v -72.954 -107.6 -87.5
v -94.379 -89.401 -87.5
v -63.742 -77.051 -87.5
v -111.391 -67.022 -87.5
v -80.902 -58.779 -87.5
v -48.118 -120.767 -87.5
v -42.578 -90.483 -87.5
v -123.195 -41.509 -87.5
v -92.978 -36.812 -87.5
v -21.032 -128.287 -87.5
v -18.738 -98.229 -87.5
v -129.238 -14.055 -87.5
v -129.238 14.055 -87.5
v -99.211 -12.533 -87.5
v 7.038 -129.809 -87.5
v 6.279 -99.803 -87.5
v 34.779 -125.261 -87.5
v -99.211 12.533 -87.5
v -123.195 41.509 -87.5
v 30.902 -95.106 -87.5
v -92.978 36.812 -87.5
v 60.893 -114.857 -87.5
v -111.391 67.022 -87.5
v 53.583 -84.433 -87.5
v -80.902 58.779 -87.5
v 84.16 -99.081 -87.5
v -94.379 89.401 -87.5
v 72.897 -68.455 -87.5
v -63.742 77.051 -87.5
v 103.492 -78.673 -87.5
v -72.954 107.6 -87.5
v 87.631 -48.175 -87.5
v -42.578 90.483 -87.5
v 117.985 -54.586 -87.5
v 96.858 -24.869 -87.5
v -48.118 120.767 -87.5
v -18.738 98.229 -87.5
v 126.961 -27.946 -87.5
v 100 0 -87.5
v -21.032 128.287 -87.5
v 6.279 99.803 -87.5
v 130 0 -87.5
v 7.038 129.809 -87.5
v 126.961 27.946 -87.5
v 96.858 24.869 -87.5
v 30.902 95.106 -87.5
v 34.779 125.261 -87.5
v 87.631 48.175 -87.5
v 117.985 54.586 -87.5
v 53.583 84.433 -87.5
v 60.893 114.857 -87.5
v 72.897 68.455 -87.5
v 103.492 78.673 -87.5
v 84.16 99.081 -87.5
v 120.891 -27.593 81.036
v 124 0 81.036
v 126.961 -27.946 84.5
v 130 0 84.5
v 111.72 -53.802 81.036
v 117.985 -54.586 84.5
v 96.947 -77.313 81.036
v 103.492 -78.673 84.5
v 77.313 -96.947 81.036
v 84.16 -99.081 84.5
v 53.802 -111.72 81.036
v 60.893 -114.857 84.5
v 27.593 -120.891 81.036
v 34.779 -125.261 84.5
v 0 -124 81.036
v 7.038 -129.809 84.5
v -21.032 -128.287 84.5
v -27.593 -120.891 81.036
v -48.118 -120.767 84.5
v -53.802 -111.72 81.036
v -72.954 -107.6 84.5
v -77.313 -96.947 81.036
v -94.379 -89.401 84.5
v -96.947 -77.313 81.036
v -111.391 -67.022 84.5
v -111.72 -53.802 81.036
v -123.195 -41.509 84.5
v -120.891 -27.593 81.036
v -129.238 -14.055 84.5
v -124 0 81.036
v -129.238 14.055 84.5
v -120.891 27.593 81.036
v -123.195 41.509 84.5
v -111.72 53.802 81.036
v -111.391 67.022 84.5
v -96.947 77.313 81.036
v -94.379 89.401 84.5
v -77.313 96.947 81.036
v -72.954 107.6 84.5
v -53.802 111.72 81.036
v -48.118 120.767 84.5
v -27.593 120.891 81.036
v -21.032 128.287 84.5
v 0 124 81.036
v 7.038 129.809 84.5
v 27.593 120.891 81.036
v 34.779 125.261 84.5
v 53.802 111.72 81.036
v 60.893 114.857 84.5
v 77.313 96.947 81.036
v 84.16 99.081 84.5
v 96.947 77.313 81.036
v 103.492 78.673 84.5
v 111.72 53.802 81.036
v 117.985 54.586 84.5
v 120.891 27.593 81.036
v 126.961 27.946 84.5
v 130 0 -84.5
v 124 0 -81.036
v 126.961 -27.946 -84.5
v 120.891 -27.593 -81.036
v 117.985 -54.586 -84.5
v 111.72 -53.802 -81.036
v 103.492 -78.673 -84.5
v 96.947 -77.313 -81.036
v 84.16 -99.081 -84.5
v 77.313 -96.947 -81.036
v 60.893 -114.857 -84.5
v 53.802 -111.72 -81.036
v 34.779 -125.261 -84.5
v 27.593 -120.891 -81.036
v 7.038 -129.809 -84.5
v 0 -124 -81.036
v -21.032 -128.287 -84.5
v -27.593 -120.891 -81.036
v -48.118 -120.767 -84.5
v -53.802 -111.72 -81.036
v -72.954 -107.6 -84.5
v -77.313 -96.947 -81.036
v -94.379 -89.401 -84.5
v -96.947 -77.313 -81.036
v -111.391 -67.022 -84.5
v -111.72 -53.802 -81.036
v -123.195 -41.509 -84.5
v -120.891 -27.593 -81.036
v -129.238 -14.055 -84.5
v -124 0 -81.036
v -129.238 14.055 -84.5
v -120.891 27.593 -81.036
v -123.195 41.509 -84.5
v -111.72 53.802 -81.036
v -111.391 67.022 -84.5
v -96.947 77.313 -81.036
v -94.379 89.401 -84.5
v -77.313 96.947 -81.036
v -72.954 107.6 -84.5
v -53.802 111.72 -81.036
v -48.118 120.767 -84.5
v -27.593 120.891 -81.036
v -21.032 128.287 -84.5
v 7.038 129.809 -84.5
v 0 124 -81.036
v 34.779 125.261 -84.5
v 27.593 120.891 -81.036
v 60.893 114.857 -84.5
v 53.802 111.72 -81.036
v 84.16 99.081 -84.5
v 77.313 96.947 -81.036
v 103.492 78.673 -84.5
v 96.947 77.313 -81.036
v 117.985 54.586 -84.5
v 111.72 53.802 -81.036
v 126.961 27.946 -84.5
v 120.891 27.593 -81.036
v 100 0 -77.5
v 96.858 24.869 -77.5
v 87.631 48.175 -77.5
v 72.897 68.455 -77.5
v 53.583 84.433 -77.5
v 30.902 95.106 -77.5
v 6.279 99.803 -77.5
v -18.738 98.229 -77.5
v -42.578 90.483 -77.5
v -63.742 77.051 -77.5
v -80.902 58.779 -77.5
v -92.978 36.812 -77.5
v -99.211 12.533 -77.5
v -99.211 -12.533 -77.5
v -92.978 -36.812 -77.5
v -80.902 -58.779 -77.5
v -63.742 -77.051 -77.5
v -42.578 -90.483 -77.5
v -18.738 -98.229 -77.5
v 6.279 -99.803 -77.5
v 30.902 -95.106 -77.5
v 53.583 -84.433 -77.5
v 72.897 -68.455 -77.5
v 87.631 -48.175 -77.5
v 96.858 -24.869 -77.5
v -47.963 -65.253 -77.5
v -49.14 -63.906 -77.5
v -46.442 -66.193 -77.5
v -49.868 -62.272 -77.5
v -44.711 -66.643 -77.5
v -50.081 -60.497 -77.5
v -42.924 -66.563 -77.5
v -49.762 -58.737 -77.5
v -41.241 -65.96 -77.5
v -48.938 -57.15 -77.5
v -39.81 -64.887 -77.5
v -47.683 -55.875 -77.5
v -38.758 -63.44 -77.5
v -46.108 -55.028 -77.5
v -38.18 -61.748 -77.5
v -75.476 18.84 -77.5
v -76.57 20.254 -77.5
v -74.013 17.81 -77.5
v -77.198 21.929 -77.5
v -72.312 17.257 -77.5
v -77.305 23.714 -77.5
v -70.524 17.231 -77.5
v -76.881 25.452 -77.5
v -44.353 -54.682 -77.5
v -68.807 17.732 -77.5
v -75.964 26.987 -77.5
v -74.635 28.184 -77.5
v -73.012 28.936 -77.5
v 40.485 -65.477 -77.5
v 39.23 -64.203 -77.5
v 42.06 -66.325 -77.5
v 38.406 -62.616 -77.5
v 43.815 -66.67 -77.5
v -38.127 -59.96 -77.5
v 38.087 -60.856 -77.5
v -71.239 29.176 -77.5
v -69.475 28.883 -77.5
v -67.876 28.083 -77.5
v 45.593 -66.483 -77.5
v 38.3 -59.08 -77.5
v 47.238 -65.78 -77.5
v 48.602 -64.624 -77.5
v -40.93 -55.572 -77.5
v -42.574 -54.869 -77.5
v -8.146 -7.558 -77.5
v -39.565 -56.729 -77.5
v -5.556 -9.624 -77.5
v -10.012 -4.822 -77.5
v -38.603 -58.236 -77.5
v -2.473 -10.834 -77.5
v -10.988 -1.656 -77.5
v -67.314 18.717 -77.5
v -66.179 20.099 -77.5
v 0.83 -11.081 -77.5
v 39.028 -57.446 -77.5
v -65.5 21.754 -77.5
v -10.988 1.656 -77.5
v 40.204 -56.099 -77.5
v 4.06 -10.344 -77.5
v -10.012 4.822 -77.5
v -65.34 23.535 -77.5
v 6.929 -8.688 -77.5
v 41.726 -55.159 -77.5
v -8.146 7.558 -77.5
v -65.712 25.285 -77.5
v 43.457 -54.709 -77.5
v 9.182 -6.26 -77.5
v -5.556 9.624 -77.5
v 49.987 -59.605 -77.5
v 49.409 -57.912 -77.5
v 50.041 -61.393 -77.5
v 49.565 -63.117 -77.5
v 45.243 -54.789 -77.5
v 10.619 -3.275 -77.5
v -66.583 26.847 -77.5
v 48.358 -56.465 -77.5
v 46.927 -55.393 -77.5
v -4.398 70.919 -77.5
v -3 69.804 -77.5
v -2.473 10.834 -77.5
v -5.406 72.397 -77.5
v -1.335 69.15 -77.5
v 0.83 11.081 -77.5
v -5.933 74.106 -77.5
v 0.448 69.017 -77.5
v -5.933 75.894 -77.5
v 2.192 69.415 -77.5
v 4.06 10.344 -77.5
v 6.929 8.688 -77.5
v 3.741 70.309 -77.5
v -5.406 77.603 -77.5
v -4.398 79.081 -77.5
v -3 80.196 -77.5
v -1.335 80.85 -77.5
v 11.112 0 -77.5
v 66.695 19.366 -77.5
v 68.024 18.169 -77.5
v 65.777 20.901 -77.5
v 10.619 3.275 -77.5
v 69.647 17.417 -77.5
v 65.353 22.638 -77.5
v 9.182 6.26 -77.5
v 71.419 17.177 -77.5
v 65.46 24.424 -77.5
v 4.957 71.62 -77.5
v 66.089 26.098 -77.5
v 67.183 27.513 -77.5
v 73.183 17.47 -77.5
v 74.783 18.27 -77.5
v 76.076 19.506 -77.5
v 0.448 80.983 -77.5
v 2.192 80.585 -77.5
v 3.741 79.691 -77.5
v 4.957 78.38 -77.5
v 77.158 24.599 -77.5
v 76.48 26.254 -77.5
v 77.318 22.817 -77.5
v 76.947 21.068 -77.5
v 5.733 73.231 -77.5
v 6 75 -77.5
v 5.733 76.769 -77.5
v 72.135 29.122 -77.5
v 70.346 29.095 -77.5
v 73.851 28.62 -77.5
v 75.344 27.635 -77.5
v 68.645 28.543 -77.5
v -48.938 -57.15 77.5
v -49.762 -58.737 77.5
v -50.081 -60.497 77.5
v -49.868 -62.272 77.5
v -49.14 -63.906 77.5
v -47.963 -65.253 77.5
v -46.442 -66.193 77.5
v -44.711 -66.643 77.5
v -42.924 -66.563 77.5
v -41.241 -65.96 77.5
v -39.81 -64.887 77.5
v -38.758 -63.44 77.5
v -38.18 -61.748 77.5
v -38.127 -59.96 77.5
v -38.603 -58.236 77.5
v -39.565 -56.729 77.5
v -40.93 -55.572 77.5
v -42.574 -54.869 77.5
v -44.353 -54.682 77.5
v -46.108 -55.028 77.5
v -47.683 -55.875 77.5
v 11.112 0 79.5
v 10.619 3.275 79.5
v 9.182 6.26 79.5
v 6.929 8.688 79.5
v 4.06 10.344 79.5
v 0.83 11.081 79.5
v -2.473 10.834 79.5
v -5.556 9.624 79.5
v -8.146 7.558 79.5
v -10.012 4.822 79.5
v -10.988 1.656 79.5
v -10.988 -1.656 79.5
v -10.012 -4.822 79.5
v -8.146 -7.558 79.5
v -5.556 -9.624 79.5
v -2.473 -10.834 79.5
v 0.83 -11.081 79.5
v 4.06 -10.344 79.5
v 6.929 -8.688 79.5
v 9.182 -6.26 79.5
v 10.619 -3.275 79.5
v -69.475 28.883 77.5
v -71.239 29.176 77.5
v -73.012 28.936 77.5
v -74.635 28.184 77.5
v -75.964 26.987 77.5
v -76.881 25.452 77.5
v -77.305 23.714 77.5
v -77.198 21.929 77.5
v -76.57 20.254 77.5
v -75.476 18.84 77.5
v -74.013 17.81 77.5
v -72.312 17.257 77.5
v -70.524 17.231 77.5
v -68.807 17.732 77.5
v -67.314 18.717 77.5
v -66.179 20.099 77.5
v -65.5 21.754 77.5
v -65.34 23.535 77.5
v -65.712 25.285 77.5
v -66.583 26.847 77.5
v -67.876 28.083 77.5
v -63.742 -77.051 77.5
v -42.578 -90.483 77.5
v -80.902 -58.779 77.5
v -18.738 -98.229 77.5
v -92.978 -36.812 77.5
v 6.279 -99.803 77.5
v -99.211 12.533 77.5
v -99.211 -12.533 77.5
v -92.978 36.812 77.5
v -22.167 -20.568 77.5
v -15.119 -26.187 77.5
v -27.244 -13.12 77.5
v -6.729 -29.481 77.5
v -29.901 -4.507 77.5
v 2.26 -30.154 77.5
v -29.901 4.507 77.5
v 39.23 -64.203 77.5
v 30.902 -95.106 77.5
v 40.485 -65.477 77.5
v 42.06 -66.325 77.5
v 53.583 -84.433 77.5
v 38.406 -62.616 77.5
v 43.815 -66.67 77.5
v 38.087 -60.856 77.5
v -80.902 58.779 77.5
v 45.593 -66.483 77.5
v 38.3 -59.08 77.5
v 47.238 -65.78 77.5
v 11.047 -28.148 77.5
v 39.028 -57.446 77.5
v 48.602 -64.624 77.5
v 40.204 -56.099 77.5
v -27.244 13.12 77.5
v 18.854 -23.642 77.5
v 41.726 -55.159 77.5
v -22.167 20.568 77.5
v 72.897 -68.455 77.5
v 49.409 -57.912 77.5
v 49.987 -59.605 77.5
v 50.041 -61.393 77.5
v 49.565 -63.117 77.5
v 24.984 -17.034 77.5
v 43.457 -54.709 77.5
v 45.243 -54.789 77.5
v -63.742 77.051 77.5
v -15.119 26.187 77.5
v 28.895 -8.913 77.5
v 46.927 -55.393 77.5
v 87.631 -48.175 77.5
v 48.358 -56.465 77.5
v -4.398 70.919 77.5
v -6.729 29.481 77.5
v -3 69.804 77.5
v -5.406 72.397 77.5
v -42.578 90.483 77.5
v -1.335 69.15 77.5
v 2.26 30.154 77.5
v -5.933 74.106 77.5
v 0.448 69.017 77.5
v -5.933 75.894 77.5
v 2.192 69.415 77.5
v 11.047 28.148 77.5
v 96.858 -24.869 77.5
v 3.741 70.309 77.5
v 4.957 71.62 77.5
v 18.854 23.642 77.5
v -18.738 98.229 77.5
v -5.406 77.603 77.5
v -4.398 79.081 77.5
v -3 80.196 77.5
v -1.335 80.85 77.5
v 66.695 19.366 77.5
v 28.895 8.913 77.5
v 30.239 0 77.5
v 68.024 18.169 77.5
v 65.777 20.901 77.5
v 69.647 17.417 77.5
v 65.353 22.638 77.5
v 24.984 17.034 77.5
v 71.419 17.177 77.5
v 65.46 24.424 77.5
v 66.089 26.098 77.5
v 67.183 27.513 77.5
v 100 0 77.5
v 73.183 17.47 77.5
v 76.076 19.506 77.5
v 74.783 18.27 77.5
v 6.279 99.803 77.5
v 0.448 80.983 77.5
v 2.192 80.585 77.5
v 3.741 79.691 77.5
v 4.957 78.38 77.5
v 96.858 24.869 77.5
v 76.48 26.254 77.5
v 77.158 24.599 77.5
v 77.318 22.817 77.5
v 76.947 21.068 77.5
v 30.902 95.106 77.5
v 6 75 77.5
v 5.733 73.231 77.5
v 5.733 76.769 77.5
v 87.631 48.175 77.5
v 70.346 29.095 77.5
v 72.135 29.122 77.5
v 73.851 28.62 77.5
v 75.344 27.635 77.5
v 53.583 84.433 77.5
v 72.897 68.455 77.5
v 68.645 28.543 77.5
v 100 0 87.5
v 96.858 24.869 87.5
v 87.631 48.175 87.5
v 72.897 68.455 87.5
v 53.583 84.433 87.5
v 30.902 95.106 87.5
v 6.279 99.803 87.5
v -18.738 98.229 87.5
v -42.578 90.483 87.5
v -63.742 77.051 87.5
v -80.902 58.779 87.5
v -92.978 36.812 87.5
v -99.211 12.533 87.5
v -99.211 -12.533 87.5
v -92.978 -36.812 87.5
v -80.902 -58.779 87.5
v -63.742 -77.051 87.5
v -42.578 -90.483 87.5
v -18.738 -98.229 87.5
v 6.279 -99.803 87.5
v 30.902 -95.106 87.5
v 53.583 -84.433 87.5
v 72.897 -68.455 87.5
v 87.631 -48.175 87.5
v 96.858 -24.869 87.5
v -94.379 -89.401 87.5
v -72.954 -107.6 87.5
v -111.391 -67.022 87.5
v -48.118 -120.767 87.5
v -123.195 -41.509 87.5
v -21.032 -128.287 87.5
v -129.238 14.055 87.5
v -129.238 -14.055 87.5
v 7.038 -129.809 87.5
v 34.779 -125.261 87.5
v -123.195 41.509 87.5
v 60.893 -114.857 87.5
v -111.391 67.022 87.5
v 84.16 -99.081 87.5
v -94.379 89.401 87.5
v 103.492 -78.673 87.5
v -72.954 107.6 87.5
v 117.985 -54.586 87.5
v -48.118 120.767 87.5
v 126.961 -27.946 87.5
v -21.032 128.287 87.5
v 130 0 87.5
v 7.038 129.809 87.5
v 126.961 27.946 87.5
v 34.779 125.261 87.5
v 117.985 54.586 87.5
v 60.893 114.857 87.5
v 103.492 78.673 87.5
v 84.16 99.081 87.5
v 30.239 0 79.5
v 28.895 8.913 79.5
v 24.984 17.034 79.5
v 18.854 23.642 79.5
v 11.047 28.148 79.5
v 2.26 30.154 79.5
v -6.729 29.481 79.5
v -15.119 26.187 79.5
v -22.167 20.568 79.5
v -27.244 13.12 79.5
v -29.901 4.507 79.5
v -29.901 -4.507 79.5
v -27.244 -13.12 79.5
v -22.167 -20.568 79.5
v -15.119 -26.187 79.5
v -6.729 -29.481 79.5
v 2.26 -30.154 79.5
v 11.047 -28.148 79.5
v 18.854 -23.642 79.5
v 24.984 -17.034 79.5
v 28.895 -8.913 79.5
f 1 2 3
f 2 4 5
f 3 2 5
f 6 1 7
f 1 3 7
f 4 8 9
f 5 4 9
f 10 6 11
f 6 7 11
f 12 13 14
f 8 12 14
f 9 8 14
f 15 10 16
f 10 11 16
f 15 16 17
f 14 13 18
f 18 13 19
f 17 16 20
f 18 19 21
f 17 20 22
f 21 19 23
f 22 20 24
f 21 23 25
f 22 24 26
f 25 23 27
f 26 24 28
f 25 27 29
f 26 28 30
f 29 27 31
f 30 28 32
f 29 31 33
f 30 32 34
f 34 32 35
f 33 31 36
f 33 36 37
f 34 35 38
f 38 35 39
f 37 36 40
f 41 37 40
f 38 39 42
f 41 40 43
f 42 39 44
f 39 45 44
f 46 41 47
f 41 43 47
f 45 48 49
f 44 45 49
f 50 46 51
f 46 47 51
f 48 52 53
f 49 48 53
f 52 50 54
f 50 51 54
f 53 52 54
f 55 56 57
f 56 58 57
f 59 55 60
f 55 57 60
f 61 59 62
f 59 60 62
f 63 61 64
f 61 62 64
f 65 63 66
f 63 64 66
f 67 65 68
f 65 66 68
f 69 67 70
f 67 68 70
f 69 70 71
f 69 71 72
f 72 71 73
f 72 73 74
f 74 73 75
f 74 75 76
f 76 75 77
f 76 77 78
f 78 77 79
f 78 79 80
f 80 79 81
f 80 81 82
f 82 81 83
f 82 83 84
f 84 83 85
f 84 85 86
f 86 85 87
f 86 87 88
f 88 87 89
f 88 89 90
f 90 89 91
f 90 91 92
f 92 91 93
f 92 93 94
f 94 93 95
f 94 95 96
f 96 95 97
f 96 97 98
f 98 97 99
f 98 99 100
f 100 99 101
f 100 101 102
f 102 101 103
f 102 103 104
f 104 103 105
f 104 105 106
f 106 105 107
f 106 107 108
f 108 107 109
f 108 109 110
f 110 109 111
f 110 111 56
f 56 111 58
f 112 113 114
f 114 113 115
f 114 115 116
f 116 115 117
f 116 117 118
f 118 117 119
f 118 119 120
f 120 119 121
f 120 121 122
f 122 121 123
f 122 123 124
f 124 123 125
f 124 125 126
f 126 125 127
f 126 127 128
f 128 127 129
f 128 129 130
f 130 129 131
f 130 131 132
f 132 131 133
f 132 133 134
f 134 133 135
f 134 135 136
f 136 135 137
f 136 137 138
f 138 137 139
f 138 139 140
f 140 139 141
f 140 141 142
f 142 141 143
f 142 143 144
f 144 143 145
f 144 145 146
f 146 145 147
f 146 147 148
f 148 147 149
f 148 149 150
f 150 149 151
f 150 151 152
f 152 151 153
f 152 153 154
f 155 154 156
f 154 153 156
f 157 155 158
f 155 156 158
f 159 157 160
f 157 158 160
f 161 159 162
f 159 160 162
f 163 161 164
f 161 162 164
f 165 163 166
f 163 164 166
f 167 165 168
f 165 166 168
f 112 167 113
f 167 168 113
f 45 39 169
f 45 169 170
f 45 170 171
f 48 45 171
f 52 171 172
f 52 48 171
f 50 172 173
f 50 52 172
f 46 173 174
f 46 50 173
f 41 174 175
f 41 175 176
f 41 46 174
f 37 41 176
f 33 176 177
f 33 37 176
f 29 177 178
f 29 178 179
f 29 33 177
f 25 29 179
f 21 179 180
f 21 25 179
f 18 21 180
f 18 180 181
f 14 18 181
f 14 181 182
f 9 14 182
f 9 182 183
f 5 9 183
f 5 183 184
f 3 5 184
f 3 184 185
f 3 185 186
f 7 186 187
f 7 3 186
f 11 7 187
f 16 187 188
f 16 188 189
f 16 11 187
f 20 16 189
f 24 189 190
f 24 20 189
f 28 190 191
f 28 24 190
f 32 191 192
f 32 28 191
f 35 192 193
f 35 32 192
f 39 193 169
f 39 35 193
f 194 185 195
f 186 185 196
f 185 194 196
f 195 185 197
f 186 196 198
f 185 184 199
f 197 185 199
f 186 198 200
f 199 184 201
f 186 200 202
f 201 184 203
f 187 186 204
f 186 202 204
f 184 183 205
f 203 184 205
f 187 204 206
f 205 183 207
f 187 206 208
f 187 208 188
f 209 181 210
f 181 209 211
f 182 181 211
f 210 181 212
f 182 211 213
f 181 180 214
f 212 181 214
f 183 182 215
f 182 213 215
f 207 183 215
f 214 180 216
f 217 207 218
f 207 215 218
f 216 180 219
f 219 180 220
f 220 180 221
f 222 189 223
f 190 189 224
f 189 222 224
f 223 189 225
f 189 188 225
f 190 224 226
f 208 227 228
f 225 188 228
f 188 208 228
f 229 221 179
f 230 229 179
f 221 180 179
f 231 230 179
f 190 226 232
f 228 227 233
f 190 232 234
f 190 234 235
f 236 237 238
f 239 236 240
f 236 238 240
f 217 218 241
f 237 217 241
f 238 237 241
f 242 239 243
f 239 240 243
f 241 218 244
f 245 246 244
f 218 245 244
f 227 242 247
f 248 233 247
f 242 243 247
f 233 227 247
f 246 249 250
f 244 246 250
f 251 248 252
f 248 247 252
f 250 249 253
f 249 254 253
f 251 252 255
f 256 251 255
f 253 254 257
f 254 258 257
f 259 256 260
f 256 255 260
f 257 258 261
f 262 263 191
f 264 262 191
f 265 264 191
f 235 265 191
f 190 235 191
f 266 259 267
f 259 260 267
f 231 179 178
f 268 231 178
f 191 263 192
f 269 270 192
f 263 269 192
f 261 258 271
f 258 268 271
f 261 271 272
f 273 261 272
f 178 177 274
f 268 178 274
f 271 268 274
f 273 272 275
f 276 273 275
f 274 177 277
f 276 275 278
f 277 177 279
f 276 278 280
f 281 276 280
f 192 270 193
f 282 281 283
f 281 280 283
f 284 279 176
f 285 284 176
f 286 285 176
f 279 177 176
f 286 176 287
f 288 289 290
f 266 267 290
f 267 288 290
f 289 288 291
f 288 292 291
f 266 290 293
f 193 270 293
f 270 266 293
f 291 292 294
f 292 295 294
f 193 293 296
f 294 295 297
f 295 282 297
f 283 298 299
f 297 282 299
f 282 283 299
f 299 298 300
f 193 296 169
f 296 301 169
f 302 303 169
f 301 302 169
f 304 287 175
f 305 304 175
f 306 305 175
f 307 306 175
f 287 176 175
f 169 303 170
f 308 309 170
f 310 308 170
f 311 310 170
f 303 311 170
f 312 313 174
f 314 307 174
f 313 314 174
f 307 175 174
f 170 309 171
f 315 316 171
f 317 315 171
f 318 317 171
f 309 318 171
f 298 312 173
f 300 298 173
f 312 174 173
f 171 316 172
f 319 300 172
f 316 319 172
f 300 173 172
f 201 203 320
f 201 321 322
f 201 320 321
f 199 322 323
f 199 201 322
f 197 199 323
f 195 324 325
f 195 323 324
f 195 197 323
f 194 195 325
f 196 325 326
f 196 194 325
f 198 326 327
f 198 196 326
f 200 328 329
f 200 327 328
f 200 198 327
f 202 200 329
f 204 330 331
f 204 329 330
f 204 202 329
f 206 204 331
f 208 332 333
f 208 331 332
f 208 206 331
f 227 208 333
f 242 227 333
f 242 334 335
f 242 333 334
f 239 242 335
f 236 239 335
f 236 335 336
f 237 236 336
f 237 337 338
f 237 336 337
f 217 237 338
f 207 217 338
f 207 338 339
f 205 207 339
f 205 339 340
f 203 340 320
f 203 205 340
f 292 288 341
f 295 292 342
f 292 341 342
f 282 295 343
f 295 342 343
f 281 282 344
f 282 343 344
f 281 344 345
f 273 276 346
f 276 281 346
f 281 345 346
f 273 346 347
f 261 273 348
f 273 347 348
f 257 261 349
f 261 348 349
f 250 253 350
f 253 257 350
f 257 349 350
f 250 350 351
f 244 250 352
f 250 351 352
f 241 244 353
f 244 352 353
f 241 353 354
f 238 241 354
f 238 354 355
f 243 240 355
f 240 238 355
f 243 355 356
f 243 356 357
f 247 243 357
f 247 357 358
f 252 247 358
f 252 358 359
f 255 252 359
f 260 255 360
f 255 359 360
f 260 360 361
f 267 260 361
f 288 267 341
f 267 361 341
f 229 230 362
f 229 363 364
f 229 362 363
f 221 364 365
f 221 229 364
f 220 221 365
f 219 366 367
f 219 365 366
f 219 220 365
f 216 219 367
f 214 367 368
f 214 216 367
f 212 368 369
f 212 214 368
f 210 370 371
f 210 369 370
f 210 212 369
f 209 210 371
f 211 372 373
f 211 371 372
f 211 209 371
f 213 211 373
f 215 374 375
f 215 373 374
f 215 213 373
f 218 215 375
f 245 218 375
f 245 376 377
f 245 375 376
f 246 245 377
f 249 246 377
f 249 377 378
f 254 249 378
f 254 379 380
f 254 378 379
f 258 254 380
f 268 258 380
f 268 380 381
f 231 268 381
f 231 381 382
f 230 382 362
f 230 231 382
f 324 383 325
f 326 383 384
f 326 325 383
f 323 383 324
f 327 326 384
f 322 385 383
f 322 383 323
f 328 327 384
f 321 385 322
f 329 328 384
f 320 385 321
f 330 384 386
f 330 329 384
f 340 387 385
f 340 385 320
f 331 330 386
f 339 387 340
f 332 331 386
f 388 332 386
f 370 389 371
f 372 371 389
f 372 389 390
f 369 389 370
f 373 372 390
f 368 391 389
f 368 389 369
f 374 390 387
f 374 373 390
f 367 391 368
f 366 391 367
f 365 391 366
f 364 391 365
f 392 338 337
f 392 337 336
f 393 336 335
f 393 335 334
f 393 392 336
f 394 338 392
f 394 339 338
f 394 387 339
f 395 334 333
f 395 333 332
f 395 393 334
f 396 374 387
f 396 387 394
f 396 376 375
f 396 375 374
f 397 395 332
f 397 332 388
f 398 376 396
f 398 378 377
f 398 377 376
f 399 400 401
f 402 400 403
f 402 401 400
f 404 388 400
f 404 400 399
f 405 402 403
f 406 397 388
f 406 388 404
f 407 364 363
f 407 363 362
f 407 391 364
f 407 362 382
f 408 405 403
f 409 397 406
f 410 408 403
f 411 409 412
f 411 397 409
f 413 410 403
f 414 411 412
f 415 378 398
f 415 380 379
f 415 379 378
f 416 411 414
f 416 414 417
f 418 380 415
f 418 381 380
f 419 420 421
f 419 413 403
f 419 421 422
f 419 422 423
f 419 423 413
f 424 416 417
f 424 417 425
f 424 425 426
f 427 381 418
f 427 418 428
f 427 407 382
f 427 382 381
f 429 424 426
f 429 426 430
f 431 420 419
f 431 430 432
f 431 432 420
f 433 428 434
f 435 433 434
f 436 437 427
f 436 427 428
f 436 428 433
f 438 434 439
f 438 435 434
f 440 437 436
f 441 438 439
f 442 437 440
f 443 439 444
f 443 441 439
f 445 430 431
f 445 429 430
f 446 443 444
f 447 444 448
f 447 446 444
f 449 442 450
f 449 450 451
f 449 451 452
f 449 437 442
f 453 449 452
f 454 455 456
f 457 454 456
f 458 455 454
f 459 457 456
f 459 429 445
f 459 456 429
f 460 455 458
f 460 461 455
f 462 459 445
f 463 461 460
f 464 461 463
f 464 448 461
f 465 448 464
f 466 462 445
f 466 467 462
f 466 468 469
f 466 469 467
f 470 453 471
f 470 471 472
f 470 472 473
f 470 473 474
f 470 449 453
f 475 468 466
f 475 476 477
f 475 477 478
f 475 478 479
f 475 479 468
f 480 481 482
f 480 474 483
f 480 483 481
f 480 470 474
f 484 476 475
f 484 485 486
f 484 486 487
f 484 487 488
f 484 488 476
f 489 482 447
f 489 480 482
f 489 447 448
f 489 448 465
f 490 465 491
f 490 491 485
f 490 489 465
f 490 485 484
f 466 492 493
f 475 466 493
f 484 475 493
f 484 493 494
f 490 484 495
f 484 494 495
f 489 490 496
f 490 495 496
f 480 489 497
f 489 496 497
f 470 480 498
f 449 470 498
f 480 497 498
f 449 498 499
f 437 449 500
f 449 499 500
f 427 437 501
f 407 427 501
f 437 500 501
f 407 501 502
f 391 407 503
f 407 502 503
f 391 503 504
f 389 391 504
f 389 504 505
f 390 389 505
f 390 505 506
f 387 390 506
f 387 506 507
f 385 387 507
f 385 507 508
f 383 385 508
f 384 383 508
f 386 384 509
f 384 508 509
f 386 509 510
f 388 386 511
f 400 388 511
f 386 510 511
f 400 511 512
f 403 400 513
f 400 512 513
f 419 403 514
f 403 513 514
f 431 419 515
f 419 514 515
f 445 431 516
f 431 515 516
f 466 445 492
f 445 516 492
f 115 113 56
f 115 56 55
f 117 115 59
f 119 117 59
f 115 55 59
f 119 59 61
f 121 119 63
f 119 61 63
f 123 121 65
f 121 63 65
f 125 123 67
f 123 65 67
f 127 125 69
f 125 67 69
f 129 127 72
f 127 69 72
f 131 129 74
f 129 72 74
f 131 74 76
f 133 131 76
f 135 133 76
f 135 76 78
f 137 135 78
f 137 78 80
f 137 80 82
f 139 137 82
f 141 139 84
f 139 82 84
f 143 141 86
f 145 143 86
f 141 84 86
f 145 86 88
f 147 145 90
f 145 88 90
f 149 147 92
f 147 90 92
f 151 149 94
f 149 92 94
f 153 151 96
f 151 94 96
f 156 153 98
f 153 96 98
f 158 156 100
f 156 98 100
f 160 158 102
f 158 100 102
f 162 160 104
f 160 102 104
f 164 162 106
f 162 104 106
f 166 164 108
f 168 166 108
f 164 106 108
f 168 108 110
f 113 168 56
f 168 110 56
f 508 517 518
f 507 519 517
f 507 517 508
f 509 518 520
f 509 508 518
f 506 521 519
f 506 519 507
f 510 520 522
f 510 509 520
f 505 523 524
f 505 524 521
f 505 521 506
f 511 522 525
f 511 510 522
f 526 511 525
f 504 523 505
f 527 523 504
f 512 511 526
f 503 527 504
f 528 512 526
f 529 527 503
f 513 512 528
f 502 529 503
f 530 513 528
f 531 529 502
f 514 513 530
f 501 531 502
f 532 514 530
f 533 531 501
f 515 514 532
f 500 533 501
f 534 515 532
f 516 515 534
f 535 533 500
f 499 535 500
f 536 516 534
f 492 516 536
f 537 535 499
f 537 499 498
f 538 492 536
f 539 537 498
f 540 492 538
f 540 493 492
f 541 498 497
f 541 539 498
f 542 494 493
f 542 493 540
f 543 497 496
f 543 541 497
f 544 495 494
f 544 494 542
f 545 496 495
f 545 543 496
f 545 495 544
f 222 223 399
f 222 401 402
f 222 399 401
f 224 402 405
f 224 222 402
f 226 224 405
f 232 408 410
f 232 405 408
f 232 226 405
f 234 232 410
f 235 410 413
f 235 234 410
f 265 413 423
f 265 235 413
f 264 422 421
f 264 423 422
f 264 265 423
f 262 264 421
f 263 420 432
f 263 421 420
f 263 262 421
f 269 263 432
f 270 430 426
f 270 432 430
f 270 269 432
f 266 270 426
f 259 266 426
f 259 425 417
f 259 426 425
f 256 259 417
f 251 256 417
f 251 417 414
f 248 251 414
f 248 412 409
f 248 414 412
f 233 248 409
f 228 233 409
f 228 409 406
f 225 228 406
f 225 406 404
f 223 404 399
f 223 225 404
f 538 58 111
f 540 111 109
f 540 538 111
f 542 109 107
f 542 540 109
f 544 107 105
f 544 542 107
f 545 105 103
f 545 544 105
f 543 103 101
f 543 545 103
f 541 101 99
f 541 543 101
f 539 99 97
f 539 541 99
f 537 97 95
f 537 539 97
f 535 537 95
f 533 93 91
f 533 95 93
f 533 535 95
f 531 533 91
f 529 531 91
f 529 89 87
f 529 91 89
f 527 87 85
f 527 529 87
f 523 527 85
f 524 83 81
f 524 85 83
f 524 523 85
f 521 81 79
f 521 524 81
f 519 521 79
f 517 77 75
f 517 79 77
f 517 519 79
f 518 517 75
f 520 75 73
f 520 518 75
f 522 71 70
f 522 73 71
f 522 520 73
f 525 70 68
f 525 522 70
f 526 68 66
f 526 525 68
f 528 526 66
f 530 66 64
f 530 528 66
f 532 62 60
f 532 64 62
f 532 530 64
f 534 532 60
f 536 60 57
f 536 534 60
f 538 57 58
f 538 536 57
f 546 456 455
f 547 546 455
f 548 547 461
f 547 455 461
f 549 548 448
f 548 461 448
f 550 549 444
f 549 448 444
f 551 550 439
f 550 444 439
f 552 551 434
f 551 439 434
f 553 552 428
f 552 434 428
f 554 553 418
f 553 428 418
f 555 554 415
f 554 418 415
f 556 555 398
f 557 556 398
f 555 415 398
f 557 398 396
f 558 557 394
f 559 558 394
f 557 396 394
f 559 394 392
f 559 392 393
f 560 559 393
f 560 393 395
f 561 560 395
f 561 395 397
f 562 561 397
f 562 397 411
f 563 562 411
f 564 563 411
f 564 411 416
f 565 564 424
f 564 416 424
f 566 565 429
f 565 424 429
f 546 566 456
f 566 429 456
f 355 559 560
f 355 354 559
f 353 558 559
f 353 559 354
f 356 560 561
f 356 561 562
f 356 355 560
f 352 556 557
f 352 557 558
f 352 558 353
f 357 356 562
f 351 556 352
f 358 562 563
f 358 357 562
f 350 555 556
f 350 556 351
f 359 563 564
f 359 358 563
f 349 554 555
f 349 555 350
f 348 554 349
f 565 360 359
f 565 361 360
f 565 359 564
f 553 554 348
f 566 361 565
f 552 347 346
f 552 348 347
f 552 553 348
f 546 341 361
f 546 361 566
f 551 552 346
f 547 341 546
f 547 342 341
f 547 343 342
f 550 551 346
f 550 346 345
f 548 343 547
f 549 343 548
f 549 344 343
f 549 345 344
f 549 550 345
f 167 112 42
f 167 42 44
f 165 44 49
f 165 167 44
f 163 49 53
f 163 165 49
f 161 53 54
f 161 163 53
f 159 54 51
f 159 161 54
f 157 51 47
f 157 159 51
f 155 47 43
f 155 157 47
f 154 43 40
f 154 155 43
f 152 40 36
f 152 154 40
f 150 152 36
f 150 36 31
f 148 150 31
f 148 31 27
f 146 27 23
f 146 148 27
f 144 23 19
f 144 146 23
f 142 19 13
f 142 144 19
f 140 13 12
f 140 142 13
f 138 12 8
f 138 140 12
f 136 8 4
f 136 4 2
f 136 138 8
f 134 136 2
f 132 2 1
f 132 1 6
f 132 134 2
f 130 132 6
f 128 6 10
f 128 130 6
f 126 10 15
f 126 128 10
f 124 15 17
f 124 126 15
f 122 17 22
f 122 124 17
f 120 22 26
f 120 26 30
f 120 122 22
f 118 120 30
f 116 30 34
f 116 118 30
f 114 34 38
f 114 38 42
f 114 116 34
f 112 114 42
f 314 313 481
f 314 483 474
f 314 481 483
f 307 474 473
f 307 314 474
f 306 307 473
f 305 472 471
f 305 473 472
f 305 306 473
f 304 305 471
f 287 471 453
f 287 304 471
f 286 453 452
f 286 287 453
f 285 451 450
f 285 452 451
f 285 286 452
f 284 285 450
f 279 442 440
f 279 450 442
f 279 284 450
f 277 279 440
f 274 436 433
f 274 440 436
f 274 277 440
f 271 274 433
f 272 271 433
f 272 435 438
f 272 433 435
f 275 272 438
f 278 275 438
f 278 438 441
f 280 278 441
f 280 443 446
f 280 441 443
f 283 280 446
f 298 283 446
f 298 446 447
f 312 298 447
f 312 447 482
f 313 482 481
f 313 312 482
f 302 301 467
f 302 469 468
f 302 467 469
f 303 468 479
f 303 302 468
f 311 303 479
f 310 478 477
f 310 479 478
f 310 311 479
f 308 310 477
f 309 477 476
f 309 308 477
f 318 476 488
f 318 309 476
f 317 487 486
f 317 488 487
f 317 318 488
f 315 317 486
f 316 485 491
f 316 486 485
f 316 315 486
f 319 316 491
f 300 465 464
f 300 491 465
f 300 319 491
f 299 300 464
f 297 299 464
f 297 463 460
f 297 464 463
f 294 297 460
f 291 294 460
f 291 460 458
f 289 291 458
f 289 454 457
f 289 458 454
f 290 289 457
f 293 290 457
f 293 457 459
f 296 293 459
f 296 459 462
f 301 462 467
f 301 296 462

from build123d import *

# Parameters (mm, degrees)
SKETCH1_R                = 130
SKETCH1_R_2              = 11.1125
BOSS_EXTRUDE1_DEPTH      = 87.5
SKETCH2_R                = 100
CUT_EXTRUDE1_DEPTH       = 10
CUT_EXTRUDE2_START       = -166
SKETCH3_R                = 6
CUT_EXTRUDE2_DEPTH       = 177
CIRPATTERN1_COUNT        = 5
SKETCH4_R                = 30.2387
SKETCH4_R_2              = 11.1125
BOSS_EXTRUDE2_DEPTH      = 2
BOSS_EXTRUDE2_DEPTH_BACK = 7


with BuildPart() as part:
    # Sketch1 → Boss-Extrude1 (new body, symmetric)
    with BuildSketch(Plane.XY):
        Circle(SKETCH1_R)
        Circle(SKETCH1_R_2, mode=Mode.SUBTRACT)
    extrude(amount=BOSS_EXTRUDE1_DEPTH, both=True)

    # Sketch2 → Cut-Extrude1 (cut)
    with BuildSketch(Plane.XY.offset(87.5)):
        Circle(SKETCH2_R)
    cut_extrude1 = extrude(amount=-CUT_EXTRUDE1_DEPTH, mode=Mode.SUBTRACT)

    # Mirror1: Cut-Extrude1 across plane
    add(cut_extrude1.mirror(Plane.XY), mode=Mode.SUBTRACT)

    # Sketch3 → Cut-Extrude2 (cut)
    with BuildSketch(Plane.XY.offset(77.5).offset(CUT_EXTRUDE2_START)):
        with Locations((0, 75)):
            Circle(SKETCH3_R)
    cut_extrude2 = extrude(amount=CUT_EXTRUDE2_DEPTH, mode=Mode.SUBTRACT)

    # CirPattern1: Cut-Extrude2 ×5 about axis
    cirpattern1_axis = Axis((0, 0, 0), (0, 0, 1))
    for i in range(1, CIRPATTERN1_COUNT):
        add(cut_extrude2.rotate(cirpattern1_axis, i * 360 / CIRPATTERN1_COUNT), mode=Mode.SUBTRACT)

    # Sketch4 → Boss-Extrude2 (add, two sides)
    with BuildSketch(Plane.XY.offset(77.5)) as boss_extrude2_sk:
        Circle(SKETCH4_R)
        Circle(SKETCH4_R_2, mode=Mode.SUBTRACT)
    extrude(amount=BOSS_EXTRUDE2_DEPTH)
    extrude(boss_extrude2_sk.sketch, amount=-BOSS_EXTRUDE2_DEPTH_BACK)

    # Sketch5 → Cut-Revolve1 (revolve, cut)
    with BuildSketch(Plane(origin=(0, 0, 0), x_dir=(1, 0, 0), z_dir=(0, 1, 0))):
        Polygon((130, 84.5), (124, 81.035898385), (124, -81.035898385), (130, -84.5), align=None)
    revolve(axis=Axis((0, 0, 0), (0, 0, -1)), mode=Mode.SUBTRACT)


solid = part.part
